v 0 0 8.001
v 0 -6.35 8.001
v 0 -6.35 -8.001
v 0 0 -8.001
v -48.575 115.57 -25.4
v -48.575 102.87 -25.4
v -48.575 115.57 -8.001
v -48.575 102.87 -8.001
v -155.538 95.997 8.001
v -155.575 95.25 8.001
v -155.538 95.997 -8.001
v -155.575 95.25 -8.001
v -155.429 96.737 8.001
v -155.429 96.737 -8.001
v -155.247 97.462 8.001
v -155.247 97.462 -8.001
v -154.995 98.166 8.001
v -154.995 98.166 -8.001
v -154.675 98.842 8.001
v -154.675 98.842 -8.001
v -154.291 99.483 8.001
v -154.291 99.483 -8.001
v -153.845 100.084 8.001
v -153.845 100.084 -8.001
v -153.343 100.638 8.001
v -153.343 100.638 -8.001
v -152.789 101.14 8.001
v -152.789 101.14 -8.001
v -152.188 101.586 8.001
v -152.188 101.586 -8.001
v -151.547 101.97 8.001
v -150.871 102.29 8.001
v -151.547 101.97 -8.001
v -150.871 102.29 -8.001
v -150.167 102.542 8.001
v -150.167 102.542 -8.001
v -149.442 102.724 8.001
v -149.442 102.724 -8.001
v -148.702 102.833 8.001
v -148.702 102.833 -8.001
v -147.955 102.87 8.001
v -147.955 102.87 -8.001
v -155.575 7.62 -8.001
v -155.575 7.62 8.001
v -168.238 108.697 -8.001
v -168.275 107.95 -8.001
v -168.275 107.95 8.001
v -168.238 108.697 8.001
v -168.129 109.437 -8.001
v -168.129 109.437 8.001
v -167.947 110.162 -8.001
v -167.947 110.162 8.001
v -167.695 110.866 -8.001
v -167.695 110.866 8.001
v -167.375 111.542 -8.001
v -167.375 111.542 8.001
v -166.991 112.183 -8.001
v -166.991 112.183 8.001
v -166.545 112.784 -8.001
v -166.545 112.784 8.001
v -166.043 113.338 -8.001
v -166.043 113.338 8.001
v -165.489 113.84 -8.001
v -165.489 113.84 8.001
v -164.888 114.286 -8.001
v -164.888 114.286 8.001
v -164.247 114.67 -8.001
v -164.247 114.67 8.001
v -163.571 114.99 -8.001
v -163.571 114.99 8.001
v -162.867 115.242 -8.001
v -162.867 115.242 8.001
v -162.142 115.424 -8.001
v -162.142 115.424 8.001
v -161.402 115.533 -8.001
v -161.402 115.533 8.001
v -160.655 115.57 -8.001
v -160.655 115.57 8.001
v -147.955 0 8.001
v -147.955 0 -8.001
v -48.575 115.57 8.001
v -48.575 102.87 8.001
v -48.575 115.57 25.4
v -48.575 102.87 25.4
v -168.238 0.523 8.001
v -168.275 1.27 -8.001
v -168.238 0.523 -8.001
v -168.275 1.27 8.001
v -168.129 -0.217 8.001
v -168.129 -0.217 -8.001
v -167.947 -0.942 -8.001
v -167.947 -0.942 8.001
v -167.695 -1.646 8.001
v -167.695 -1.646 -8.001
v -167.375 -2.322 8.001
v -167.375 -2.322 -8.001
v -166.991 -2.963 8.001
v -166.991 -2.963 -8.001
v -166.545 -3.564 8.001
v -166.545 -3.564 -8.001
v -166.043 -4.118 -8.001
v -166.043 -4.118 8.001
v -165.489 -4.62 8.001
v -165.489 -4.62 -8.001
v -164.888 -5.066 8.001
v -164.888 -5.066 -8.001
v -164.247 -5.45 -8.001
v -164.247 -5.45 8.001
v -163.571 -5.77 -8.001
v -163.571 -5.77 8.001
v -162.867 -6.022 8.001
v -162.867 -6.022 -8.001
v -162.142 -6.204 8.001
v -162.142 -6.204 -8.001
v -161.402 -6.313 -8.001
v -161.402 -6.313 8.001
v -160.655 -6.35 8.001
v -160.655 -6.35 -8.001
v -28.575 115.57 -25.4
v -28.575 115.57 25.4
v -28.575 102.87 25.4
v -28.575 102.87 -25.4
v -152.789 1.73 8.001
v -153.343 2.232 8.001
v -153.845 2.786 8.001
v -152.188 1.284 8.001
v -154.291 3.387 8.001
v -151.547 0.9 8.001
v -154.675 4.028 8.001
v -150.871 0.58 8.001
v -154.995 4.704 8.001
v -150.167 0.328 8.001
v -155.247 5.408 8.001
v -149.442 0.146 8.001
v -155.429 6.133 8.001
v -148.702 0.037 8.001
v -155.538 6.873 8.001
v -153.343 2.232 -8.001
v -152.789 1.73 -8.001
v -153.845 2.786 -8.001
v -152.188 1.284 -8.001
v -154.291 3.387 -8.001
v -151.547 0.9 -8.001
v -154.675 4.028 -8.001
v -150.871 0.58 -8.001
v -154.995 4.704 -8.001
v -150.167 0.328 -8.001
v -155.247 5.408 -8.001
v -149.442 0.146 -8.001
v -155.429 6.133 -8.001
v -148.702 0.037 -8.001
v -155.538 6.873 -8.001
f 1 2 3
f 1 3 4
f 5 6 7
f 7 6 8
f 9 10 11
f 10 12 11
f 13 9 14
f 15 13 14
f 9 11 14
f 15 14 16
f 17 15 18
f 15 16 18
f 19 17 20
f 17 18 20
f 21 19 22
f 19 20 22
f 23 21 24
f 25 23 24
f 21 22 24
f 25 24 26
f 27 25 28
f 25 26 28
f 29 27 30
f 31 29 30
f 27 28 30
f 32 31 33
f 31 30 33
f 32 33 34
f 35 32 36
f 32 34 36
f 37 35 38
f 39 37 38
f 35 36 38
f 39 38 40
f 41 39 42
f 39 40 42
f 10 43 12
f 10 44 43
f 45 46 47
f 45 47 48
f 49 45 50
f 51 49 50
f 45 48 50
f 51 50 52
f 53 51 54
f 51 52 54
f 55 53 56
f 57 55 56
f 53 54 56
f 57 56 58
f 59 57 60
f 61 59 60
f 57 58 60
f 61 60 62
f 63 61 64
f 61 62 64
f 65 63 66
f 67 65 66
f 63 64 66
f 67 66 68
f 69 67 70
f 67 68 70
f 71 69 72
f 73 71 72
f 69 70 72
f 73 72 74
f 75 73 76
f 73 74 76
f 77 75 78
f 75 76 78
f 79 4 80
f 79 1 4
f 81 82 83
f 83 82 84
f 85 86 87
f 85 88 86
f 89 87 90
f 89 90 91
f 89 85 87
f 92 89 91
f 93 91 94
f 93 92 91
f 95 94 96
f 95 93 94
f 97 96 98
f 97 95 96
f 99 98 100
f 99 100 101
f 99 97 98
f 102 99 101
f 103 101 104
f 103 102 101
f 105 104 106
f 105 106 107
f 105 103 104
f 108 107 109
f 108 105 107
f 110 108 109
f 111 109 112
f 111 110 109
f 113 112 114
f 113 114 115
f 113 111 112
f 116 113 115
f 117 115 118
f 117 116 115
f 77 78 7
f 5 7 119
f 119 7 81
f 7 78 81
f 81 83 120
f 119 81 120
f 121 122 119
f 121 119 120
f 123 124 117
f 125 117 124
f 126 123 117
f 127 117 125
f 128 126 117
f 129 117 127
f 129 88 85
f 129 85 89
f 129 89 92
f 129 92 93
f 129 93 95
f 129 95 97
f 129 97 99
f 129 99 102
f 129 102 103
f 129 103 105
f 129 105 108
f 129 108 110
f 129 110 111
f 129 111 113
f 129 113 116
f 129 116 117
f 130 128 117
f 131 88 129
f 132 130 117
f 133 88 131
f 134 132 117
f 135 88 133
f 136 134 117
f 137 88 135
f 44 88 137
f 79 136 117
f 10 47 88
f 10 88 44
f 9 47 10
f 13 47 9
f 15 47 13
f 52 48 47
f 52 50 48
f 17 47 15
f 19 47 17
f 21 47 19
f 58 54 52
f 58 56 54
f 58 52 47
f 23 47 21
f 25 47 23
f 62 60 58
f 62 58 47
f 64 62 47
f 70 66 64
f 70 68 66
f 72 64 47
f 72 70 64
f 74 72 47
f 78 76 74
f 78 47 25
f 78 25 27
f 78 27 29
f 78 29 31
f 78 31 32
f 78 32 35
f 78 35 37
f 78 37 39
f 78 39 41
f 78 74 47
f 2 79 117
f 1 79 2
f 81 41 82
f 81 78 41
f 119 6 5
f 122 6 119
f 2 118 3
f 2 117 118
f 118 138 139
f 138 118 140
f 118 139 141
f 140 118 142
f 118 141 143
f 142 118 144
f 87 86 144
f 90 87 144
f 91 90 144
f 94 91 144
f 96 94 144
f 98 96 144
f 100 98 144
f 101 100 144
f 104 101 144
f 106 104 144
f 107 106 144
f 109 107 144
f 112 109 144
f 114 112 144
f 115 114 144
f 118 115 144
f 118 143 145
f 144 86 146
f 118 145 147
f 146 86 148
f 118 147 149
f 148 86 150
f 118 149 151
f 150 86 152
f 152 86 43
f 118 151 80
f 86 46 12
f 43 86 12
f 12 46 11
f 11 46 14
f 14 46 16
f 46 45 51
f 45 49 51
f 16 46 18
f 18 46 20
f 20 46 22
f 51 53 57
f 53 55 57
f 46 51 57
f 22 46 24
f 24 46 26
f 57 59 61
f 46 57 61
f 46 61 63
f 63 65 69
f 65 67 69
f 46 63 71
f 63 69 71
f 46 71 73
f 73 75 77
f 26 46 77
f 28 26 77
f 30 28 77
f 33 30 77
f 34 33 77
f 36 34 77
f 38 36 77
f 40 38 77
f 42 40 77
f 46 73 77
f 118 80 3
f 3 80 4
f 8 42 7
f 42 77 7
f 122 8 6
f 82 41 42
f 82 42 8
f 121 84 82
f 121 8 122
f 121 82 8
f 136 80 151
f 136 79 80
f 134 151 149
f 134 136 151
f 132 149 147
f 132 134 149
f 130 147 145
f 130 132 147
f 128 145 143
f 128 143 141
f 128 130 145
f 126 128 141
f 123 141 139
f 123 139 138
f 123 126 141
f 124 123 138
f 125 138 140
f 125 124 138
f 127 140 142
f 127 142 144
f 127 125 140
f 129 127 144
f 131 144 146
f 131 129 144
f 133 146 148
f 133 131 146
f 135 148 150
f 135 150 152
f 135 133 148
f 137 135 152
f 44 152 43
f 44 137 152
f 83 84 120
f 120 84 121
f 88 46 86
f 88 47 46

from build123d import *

# Parameters (mm, degrees)
BOSS_EXTRUDE1_DEPTH = 8.001
SKETCH2_W           = 20
SKETCH2_H           = 50.8
BOSS_EXTRUDE2_DEPTH = 12.7
FILLET1_R           = 7.62


with BuildPart() as part:
    # Sketch1 → Boss-Extrude1 (new body, symmetric)
    with BuildSketch(Plane.XY):
        Polygon((-28.575, 115.57), (-168.275, 115.57), (-168.275, 102.87), (-168.275, 0), (-168.275, -6.35), (0, -6.35), (0, 0), (-155.575, 0), (-155.575, 102.87), (-28.575, 102.87), align=None)
    extrude(amount=BOSS_EXTRUDE1_DEPTH, both=True)

    # Sketch2 → Boss-Extrude2 (add)
    with BuildSketch(Plane.XZ.offset(-102.87)):
        with Locations((-38.575, 0)):
            Rectangle(SKETCH2_W, SKETCH2_H)
    extrude(amount=-BOSS_EXTRUDE2_DEPTH)

    # Fillet1
    fillet1_edges = [part.edges().sort_by_distance(p)[0] for p in [
        (-155.575, 102.87, 0),
        (-155.575, 0, 0),
        (-168.275, -6.35, 0),
        (-168.275, 115.57, 0),
    ]]
    fillet(fillet1_edges, radius=FILLET1_R)


solid = part.part
